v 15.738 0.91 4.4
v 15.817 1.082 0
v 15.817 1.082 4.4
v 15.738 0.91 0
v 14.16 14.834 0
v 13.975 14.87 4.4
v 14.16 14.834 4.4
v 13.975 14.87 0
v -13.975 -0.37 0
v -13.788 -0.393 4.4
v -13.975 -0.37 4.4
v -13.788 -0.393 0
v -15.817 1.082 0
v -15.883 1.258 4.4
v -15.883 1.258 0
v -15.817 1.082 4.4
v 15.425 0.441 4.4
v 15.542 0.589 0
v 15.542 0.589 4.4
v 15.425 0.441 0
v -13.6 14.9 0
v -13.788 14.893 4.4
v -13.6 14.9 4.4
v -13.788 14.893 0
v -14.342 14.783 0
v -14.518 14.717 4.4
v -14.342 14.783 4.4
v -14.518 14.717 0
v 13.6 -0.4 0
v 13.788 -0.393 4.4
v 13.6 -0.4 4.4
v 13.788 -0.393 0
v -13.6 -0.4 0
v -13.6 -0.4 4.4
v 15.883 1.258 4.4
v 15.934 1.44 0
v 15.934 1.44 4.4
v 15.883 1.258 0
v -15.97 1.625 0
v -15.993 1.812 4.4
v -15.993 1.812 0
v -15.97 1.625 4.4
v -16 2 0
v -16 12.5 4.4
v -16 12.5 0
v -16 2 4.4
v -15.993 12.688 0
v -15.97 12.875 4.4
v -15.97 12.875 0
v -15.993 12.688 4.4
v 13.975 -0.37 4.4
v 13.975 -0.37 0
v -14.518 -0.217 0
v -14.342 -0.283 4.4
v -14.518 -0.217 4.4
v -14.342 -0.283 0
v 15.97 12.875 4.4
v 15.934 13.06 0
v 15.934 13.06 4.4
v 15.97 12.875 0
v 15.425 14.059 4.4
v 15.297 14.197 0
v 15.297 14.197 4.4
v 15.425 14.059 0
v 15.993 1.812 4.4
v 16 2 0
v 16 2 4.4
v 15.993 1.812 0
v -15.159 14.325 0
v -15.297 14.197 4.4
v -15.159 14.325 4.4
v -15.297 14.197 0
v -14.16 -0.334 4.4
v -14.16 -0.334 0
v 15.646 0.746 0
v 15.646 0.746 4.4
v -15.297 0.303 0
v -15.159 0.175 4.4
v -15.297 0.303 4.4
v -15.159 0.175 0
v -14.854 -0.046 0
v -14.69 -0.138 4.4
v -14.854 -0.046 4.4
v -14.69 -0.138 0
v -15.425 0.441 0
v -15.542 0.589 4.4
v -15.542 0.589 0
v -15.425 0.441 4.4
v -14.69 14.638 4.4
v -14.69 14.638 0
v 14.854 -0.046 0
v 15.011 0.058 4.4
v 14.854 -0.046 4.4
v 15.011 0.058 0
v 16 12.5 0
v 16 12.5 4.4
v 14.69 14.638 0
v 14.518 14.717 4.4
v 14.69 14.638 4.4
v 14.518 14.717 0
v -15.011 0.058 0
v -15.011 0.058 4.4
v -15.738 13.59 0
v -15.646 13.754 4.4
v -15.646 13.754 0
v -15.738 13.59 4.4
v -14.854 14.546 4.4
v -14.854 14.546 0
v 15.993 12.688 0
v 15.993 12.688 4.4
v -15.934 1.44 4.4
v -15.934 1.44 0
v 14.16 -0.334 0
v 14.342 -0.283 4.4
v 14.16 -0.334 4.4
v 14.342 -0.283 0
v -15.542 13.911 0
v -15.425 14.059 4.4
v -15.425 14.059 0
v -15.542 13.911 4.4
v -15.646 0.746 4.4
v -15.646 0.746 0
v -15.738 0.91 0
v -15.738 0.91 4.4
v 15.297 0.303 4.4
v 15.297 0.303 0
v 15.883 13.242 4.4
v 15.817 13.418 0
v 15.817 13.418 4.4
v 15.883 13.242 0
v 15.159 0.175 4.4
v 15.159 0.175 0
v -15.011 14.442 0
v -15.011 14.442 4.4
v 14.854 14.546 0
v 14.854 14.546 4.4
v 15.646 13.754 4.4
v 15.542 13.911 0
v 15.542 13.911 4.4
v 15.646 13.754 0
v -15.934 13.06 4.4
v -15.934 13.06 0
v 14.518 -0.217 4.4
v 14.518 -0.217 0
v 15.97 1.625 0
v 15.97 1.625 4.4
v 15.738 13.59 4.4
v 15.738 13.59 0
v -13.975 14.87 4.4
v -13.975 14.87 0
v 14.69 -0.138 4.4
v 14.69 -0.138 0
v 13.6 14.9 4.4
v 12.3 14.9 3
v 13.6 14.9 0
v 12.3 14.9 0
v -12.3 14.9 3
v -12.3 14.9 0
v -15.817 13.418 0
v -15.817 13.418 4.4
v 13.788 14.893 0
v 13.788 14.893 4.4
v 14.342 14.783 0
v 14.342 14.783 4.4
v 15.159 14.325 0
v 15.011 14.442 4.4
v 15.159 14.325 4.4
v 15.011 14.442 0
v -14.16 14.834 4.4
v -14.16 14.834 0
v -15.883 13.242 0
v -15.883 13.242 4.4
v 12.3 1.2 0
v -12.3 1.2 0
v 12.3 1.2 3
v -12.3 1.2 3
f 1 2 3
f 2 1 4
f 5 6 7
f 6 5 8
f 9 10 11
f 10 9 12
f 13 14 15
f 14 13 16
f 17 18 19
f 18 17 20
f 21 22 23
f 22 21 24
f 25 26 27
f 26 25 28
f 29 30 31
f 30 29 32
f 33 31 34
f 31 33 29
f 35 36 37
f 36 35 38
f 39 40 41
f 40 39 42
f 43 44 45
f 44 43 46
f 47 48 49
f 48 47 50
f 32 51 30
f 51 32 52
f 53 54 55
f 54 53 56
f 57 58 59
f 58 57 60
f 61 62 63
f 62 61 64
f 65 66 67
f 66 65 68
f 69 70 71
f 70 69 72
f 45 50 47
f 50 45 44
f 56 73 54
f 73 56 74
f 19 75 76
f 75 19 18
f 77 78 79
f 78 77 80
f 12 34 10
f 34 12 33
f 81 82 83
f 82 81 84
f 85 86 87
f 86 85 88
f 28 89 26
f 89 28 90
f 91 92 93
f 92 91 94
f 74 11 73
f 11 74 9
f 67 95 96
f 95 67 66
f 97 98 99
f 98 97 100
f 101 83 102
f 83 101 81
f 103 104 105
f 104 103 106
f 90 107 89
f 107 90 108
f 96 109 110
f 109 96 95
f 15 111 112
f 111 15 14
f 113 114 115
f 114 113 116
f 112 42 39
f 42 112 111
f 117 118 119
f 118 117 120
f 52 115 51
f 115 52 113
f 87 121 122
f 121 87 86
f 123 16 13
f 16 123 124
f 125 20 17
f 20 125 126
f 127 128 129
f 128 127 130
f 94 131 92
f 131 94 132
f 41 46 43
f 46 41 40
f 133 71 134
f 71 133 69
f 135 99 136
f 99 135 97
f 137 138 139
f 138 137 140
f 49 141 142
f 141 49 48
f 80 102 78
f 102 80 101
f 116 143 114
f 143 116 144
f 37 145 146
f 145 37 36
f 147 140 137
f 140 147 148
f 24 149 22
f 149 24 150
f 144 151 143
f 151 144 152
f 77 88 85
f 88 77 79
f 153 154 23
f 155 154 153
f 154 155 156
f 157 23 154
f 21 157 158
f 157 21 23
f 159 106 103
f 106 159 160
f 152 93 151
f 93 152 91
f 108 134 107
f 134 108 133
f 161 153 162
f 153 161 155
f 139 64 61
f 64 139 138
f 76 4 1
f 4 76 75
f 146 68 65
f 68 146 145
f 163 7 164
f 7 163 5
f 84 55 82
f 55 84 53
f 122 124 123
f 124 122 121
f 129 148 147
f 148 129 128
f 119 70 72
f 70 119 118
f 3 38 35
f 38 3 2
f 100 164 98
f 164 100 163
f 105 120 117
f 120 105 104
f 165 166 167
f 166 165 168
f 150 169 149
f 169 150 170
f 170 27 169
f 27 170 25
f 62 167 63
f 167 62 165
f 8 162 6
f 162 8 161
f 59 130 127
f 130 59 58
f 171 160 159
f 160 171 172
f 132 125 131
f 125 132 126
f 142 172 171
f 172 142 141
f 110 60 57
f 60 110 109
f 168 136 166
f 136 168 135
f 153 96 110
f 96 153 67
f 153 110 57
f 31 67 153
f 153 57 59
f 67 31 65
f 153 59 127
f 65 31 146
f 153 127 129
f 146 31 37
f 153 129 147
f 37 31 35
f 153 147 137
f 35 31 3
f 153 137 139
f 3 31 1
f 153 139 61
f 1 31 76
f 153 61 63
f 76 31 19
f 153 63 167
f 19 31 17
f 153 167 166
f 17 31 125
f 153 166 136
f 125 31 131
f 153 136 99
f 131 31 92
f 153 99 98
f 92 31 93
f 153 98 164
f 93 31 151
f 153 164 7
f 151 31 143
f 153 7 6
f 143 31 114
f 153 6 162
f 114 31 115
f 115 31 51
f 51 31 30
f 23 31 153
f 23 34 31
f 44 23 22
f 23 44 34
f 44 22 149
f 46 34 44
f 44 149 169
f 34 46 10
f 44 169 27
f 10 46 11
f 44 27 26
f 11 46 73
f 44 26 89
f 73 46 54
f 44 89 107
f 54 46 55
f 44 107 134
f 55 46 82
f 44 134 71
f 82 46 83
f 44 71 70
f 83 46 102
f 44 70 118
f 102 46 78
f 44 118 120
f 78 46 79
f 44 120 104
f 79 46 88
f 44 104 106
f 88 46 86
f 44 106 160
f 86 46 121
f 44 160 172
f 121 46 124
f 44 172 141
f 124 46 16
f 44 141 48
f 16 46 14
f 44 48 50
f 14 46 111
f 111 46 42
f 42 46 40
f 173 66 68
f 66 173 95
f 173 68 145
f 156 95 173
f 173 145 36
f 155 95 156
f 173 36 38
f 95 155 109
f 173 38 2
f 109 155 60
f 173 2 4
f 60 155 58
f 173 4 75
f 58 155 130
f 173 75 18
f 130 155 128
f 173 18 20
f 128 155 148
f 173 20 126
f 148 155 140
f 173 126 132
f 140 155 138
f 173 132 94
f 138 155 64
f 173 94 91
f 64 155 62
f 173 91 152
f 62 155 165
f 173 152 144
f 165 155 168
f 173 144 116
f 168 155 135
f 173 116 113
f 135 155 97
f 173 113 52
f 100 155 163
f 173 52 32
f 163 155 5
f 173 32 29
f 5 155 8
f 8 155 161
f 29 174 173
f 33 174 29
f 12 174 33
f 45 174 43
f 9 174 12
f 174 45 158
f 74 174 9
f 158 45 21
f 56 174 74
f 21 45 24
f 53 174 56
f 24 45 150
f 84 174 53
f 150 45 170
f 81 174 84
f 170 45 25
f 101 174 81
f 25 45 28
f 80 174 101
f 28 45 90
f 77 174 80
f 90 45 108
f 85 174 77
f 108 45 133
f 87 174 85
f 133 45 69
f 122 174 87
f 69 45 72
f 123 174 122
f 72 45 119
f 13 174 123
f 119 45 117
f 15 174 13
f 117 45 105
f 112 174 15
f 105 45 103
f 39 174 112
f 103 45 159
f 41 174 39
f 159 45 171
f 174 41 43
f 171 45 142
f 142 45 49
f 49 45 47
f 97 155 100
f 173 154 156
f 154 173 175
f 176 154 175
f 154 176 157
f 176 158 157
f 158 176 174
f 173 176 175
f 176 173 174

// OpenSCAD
// Phase 24: five connector notch covers. Based on physically tested Phase 23 3mm hood.
// Height increased 1.5 mm upward; 1.2 mm bottom closure added.
// Coordinates: X horizontal, Y vertical, Z projects from front panel.
$fn=80;
module cover(){
  difference(){
    hull(){
      for(x=[-13.6,13.6],y=[2,12.5])
        translate([x,y,0]) cylinder(r=2.4,h=4.4);
    }
    // Retain 3mm deep connector cavity, leave bottom 1.2mm as closing lip.
    // Open at upper end to avoid trapping connector, but bottom edge now closed.
    translate([-12.3,1.2,-0.1]) cube([24.6,16,3.1]);
  }
}
cover();
